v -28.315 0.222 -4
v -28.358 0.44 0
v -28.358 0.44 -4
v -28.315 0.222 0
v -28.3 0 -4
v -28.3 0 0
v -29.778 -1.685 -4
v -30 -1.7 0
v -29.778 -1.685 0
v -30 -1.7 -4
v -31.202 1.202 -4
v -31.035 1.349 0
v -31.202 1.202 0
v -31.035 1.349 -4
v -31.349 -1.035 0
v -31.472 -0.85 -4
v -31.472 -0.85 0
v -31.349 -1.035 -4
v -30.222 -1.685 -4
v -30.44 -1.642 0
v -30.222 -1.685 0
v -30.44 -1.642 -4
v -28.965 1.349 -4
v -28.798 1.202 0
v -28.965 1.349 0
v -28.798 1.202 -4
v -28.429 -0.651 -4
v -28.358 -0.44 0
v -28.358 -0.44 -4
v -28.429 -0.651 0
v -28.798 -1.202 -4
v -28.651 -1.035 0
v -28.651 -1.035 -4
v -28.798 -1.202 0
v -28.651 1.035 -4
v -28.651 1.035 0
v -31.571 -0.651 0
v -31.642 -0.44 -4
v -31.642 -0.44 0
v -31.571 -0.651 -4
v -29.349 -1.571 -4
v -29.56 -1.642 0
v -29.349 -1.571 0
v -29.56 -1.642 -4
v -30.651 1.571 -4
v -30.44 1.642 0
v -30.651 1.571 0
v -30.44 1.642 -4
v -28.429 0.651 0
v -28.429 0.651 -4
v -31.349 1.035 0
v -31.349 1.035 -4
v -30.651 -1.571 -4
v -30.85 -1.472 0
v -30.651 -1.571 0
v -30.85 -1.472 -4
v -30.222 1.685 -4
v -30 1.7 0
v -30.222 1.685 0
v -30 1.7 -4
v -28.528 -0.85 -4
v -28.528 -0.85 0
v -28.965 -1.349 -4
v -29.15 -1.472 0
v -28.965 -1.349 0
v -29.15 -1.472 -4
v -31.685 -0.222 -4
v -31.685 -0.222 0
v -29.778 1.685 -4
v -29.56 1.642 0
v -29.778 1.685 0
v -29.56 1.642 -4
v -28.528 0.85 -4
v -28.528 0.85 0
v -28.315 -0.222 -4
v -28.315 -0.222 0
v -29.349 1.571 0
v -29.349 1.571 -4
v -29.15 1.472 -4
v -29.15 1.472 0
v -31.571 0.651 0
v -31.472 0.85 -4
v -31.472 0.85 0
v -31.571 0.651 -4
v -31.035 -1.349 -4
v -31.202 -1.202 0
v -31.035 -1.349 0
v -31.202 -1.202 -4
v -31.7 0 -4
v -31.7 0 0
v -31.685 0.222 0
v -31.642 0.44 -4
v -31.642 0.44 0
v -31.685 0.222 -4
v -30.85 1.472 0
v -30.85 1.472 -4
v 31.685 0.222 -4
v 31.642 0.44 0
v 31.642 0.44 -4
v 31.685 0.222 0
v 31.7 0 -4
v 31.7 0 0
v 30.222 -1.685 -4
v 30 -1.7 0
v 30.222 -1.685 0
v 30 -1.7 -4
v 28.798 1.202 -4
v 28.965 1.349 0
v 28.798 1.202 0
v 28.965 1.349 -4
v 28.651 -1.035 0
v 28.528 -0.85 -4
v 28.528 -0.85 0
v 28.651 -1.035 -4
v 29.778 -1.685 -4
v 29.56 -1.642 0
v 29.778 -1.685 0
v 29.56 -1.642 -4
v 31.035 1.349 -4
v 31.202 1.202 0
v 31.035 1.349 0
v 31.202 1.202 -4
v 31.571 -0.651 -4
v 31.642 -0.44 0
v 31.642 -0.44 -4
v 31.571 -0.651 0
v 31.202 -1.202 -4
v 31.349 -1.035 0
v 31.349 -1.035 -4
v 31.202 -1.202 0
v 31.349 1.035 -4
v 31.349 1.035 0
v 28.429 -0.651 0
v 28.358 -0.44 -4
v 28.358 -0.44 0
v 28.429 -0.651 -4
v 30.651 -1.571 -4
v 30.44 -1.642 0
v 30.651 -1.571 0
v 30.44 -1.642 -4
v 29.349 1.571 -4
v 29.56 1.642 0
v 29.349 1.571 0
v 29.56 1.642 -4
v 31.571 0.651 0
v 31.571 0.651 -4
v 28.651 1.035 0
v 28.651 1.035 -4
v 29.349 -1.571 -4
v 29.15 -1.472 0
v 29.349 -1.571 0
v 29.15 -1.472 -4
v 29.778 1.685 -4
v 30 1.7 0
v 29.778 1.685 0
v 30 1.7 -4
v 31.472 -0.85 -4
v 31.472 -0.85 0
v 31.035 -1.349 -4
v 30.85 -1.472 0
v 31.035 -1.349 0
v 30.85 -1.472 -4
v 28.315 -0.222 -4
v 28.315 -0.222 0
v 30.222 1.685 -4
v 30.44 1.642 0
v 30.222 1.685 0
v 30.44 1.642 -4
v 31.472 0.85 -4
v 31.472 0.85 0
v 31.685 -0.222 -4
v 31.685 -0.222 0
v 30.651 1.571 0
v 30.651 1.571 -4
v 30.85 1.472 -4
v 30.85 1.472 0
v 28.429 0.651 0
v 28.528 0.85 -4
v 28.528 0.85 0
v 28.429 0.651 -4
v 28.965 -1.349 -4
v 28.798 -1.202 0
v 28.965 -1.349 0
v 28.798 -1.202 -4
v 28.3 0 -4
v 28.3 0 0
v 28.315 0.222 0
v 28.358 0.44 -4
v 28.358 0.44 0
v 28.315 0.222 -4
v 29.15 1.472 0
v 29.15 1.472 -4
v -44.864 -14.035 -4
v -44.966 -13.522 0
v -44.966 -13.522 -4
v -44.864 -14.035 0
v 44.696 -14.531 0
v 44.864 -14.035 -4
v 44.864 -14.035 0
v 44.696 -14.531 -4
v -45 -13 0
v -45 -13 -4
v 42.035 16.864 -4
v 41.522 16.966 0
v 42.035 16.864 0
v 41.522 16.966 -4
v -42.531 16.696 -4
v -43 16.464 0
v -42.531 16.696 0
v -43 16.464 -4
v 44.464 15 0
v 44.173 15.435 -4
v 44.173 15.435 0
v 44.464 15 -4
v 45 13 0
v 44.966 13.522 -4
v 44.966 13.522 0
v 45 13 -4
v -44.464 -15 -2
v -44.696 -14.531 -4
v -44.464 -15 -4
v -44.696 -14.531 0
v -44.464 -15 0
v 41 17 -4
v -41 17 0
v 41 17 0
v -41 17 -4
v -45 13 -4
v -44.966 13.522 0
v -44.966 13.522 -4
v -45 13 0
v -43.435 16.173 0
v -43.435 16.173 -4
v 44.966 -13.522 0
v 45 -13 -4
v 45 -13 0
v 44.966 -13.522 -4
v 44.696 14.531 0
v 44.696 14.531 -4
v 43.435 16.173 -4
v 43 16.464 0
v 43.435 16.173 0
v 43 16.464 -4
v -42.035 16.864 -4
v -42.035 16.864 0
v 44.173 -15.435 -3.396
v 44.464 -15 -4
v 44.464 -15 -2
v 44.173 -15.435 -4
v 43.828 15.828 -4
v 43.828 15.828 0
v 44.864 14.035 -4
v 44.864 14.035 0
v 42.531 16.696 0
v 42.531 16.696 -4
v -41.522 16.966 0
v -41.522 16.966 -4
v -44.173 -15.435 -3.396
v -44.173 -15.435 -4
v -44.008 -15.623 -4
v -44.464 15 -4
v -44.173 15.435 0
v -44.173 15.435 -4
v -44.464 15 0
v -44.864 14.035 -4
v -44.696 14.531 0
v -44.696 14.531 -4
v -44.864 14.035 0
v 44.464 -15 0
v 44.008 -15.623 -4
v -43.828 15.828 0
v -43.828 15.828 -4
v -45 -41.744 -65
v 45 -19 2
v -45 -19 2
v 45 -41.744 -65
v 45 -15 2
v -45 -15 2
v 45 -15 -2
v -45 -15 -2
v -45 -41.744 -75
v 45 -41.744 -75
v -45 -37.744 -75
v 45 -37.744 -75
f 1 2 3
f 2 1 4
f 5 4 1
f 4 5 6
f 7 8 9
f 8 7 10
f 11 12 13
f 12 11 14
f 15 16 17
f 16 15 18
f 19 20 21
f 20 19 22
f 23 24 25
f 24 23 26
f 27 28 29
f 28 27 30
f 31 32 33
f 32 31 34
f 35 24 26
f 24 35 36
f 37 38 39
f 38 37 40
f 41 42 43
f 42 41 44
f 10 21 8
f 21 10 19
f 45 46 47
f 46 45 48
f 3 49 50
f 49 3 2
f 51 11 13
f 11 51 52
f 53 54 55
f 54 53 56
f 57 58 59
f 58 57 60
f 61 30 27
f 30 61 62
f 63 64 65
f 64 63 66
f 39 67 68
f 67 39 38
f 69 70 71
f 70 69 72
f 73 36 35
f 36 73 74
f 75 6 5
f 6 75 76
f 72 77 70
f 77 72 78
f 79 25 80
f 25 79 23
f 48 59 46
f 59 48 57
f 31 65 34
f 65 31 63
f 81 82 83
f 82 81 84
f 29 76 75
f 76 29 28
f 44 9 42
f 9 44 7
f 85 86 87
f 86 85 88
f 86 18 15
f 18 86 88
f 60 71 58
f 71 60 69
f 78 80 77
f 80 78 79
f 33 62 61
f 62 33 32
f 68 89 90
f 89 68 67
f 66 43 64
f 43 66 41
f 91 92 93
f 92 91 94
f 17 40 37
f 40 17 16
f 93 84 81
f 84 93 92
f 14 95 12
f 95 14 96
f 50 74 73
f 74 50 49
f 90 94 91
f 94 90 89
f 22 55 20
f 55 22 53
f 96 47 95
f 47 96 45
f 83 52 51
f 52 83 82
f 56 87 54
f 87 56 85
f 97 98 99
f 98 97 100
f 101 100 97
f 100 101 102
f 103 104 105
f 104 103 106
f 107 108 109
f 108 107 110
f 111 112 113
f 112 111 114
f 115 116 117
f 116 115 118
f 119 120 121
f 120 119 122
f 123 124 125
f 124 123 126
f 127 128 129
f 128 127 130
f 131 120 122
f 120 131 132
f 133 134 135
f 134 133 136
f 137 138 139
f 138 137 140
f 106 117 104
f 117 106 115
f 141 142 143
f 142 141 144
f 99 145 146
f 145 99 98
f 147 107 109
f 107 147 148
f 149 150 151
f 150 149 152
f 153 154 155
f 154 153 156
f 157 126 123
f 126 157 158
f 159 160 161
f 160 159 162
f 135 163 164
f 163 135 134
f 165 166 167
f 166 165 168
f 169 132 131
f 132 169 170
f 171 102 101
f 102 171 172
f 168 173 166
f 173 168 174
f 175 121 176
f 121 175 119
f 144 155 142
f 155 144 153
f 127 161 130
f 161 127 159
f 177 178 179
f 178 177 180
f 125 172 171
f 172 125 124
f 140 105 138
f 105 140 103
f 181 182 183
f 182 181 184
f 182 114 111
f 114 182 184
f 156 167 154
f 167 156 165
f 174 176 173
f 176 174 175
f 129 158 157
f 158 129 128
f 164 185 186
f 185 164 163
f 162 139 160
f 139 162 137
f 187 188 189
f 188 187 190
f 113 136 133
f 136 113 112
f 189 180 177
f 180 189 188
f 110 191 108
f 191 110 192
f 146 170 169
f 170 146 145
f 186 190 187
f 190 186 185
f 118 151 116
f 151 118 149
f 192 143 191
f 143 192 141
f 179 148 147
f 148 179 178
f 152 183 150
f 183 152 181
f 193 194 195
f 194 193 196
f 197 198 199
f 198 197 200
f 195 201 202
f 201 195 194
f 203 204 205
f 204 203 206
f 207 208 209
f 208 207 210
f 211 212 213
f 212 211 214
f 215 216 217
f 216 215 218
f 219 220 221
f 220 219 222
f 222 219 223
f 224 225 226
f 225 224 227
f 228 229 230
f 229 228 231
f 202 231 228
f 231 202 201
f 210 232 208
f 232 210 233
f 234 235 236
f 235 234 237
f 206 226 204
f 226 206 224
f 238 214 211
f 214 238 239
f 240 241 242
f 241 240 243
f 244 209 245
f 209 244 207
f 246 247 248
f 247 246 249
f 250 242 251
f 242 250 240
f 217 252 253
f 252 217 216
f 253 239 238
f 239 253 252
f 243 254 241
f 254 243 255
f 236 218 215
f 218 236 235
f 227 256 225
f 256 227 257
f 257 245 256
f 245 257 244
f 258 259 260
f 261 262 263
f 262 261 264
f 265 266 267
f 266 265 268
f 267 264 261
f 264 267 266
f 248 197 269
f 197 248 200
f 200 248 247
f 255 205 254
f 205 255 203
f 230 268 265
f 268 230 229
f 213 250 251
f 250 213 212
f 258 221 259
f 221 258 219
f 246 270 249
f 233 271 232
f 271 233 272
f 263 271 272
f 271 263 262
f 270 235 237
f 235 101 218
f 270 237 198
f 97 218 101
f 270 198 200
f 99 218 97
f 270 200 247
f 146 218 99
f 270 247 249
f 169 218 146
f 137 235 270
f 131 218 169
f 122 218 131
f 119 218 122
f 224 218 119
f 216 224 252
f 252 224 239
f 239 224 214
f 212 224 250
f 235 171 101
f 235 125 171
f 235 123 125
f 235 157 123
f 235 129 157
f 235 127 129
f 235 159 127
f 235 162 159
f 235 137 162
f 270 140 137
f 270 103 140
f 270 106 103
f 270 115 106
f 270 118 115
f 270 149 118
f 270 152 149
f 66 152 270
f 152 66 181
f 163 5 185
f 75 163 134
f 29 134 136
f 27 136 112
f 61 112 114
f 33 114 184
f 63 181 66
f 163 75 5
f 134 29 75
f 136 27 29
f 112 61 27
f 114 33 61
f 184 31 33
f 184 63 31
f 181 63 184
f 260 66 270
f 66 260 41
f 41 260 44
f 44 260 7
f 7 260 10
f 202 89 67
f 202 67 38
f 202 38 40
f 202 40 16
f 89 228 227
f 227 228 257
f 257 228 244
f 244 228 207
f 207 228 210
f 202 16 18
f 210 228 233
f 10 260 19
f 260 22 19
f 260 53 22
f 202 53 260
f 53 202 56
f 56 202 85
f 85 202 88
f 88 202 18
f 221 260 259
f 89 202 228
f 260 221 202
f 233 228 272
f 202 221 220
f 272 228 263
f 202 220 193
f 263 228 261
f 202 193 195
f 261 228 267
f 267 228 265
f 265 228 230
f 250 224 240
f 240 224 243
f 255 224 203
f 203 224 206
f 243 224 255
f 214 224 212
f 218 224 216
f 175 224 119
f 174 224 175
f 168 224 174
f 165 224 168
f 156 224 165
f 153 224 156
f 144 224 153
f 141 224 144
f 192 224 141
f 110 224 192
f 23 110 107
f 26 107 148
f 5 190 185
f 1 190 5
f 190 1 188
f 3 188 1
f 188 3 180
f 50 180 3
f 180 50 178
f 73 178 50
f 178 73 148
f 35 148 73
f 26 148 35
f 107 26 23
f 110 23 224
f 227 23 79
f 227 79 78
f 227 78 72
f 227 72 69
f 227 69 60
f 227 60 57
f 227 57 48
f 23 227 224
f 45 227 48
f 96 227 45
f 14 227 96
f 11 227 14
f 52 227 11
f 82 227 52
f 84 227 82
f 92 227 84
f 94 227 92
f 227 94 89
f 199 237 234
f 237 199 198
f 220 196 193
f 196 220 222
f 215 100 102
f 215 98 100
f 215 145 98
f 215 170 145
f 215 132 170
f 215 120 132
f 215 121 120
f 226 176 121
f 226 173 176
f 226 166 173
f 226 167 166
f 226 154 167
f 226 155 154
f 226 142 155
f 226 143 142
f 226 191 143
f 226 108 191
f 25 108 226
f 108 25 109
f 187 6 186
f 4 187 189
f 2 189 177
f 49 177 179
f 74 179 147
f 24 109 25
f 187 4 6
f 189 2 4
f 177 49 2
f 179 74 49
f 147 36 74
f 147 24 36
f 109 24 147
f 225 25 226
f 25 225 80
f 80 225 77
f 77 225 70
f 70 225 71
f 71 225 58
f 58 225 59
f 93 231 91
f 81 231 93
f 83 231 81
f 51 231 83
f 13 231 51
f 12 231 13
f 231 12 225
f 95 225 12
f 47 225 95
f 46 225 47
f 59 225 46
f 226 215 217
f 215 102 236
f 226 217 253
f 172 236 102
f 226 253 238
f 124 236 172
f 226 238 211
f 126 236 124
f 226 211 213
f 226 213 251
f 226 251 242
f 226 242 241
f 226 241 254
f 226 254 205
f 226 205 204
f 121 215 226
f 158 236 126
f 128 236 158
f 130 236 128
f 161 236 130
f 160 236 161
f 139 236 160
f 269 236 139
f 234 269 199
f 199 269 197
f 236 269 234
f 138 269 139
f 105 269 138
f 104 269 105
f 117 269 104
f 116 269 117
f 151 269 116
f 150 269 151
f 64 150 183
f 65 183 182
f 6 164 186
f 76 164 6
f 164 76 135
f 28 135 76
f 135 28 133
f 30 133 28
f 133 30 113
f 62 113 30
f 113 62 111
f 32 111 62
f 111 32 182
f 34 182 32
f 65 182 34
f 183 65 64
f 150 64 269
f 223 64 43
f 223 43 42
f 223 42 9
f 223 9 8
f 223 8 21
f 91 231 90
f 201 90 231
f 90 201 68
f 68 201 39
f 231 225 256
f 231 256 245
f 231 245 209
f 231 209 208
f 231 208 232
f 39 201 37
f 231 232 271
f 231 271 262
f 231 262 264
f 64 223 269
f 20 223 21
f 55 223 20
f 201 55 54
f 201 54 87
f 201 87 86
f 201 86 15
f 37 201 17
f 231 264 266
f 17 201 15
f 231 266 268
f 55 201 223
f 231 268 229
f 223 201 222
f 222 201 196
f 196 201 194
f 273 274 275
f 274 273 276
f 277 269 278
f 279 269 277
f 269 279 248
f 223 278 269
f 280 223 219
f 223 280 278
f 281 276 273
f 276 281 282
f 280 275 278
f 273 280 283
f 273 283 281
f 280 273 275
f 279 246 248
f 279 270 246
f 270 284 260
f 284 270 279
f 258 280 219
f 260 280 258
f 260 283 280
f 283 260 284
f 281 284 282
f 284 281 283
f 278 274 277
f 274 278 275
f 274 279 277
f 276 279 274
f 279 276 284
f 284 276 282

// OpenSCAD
// file: params.scad
// Shared dimensions for the kitchen dashboard case + accessories.
// Measured from the physical board (2026-09-12) unless noted "estimate".

// --- board (DIYmalls/Sunton ESP32-8048S043C) ---
board_l = 123.23;
board_w = 74;
board_pcb_t = 2.5;
board_stack_t = 8.5;       // full depth incl. display glass + tallest connector
screen_active_l = 105.55;
screen_active_w = 67.29;

// Corner mounting hole inset from each board edge — estimated from photos,
// NOT measured directly. Verify against the physical board before printing
// the first standoff test piece.
board_hole_inset = 6;
board_hole_d = 3.2;        // clearance hole for M3
standoff_od = 6;
standoff_pilot_d = 2.5;    // self-tapping pilot for M3 into a printed standoff

// --- case shell ---
wall_t = 2.4;
corner_r = 6;
bezel_margin_lr = 9;       // left/right front-face margin
bezel_margin_bottom = 9;   // bottom front-face margin
bezel_margin_top = 30;     // extra room up top so the PIR bore clears the screen

case_outer_l = board_l + 2 * bezel_margin_lr;                    // 141.23
case_outer_w = board_w + bezel_margin_top + bezel_margin_bottom; // 113

// The board+screen assembly sits off-center in y within the taller case,
// shifted down by half the top/bottom margin difference. Applied to the
// screen cutout AND the board standoffs so they stay aligned to each other.
board_center_y_offset = -(bezel_margin_top - bezel_margin_bottom) / 2; // -10.5

board_zone_depth = board_stack_t + 3;        // clearance behind board face
electronics_bay_depth = 20;                  // MT3608 + AA holder + wiring
case_depth = wall_t + board_zone_depth + electronics_bay_depth + wall_t; // ~37.9

// --- screen cutout (front face) ---
// Slight overlap onto the board's own black bezel hides print-edge
// roughness and print tolerance without covering active pixels.
screen_cutout_l = screen_active_l + 2;
screen_cutout_w = screen_active_w + 2;

// --- PIR bore (front face, centered in the top margin, above the screen) ---
pir_bore_d = 24;          // HC-SR501 dome ~23mm + clearance
pir_bore_y = case_outer_w / 2 - pir_bore_d / 2 - 1; // 1mm clear of the outer edge

// --- battery access hatch (rear face) ---
// Sized for a 3xAA holder (~53 x 16mm typical) plus margin.
hatch_l = 66;
hatch_w = 26;

// --- mount accessory interface (shared by wall_hanger.scad and stand.scad) ---
// Two M3 heat-set insert bosses on the case's exterior back face.
mount_boss_spacing = 60;   // x-distance between the two bosses
mount_boss_y = -15;        // offset from vertical center (negative = toward top)
mount_boss_insert_d = 4.6; // M3 brass heat-set insert OD
mount_boss_od = 9;
mount_screw_clearance_d = 3.4;
// main file
// Countertop kickstand accessory: screws to the case's 2 mount bosses
// (see params.scad), props the panel back ~18deg for a comfortable
// counter-viewing angle.
//
// Local axes: X = width (matches the case's horizontal), Y = vertical
// (down is -Y), Z = depth (away from the case is -Z). The mount plate's
// outward face (screw heads, away from the case) is at Z=0.

include <params.scad>

$fn = 48;

tilt_deg = 18;
mount_plate_l = mount_boss_spacing + 30;
mount_plate_w = 34;
mount_plate_t = 4;
leg_depth = 70;     // how far the foot extends behind the case
foot_w = mount_plate_l;
foot_t = 4;

module rounded_rect(l, w, r) {
    hull() {
        for (x = [-1, 1], y = [-1, 1])
            translate([x * (l / 2 - r), y * (w / 2 - r)])
                circle(r = r);
    }
}

// mounting plate — flush against the case back, screws into the 2 bosses.
// Sits with its outward (screw-head) face at Z=0, case-facing side at
// Z=mount_plate_t.
module mount_plate() {
    difference() {
        linear_extrude(height = mount_plate_t)
            rounded_rect(mount_plate_l, mount_plate_w, 4);
        translate([0, 0, -1])
            for (x = [-1, 1])
                translate([x * mount_boss_spacing / 2, 0, 0])
                    cylinder(d = mount_screw_clearance_d, h = mount_plate_t + 2);
    }
}

// angled leg + foot: a wedge hulled between a strip at the plate's bottom
// edge and a flat foot further down and back, so the foot's underside
// stays flat on the counter while the wedge itself carries the tilt.
module leg() {
    foot_drop = leg_depth * tan(tilt_deg);
    hull() {
        translate([0, -mount_plate_w / 2, 0])
            cube([foot_w, 4, 4], center = true);
        translate([0, -mount_plate_w / 2 - foot_drop, -leg_depth])
            cube([foot_w, foot_t, 10], center = true);
    }
}

union() {
    translate([0, 0, -mount_plate_t])
        mount_plate();
    leg();
}
